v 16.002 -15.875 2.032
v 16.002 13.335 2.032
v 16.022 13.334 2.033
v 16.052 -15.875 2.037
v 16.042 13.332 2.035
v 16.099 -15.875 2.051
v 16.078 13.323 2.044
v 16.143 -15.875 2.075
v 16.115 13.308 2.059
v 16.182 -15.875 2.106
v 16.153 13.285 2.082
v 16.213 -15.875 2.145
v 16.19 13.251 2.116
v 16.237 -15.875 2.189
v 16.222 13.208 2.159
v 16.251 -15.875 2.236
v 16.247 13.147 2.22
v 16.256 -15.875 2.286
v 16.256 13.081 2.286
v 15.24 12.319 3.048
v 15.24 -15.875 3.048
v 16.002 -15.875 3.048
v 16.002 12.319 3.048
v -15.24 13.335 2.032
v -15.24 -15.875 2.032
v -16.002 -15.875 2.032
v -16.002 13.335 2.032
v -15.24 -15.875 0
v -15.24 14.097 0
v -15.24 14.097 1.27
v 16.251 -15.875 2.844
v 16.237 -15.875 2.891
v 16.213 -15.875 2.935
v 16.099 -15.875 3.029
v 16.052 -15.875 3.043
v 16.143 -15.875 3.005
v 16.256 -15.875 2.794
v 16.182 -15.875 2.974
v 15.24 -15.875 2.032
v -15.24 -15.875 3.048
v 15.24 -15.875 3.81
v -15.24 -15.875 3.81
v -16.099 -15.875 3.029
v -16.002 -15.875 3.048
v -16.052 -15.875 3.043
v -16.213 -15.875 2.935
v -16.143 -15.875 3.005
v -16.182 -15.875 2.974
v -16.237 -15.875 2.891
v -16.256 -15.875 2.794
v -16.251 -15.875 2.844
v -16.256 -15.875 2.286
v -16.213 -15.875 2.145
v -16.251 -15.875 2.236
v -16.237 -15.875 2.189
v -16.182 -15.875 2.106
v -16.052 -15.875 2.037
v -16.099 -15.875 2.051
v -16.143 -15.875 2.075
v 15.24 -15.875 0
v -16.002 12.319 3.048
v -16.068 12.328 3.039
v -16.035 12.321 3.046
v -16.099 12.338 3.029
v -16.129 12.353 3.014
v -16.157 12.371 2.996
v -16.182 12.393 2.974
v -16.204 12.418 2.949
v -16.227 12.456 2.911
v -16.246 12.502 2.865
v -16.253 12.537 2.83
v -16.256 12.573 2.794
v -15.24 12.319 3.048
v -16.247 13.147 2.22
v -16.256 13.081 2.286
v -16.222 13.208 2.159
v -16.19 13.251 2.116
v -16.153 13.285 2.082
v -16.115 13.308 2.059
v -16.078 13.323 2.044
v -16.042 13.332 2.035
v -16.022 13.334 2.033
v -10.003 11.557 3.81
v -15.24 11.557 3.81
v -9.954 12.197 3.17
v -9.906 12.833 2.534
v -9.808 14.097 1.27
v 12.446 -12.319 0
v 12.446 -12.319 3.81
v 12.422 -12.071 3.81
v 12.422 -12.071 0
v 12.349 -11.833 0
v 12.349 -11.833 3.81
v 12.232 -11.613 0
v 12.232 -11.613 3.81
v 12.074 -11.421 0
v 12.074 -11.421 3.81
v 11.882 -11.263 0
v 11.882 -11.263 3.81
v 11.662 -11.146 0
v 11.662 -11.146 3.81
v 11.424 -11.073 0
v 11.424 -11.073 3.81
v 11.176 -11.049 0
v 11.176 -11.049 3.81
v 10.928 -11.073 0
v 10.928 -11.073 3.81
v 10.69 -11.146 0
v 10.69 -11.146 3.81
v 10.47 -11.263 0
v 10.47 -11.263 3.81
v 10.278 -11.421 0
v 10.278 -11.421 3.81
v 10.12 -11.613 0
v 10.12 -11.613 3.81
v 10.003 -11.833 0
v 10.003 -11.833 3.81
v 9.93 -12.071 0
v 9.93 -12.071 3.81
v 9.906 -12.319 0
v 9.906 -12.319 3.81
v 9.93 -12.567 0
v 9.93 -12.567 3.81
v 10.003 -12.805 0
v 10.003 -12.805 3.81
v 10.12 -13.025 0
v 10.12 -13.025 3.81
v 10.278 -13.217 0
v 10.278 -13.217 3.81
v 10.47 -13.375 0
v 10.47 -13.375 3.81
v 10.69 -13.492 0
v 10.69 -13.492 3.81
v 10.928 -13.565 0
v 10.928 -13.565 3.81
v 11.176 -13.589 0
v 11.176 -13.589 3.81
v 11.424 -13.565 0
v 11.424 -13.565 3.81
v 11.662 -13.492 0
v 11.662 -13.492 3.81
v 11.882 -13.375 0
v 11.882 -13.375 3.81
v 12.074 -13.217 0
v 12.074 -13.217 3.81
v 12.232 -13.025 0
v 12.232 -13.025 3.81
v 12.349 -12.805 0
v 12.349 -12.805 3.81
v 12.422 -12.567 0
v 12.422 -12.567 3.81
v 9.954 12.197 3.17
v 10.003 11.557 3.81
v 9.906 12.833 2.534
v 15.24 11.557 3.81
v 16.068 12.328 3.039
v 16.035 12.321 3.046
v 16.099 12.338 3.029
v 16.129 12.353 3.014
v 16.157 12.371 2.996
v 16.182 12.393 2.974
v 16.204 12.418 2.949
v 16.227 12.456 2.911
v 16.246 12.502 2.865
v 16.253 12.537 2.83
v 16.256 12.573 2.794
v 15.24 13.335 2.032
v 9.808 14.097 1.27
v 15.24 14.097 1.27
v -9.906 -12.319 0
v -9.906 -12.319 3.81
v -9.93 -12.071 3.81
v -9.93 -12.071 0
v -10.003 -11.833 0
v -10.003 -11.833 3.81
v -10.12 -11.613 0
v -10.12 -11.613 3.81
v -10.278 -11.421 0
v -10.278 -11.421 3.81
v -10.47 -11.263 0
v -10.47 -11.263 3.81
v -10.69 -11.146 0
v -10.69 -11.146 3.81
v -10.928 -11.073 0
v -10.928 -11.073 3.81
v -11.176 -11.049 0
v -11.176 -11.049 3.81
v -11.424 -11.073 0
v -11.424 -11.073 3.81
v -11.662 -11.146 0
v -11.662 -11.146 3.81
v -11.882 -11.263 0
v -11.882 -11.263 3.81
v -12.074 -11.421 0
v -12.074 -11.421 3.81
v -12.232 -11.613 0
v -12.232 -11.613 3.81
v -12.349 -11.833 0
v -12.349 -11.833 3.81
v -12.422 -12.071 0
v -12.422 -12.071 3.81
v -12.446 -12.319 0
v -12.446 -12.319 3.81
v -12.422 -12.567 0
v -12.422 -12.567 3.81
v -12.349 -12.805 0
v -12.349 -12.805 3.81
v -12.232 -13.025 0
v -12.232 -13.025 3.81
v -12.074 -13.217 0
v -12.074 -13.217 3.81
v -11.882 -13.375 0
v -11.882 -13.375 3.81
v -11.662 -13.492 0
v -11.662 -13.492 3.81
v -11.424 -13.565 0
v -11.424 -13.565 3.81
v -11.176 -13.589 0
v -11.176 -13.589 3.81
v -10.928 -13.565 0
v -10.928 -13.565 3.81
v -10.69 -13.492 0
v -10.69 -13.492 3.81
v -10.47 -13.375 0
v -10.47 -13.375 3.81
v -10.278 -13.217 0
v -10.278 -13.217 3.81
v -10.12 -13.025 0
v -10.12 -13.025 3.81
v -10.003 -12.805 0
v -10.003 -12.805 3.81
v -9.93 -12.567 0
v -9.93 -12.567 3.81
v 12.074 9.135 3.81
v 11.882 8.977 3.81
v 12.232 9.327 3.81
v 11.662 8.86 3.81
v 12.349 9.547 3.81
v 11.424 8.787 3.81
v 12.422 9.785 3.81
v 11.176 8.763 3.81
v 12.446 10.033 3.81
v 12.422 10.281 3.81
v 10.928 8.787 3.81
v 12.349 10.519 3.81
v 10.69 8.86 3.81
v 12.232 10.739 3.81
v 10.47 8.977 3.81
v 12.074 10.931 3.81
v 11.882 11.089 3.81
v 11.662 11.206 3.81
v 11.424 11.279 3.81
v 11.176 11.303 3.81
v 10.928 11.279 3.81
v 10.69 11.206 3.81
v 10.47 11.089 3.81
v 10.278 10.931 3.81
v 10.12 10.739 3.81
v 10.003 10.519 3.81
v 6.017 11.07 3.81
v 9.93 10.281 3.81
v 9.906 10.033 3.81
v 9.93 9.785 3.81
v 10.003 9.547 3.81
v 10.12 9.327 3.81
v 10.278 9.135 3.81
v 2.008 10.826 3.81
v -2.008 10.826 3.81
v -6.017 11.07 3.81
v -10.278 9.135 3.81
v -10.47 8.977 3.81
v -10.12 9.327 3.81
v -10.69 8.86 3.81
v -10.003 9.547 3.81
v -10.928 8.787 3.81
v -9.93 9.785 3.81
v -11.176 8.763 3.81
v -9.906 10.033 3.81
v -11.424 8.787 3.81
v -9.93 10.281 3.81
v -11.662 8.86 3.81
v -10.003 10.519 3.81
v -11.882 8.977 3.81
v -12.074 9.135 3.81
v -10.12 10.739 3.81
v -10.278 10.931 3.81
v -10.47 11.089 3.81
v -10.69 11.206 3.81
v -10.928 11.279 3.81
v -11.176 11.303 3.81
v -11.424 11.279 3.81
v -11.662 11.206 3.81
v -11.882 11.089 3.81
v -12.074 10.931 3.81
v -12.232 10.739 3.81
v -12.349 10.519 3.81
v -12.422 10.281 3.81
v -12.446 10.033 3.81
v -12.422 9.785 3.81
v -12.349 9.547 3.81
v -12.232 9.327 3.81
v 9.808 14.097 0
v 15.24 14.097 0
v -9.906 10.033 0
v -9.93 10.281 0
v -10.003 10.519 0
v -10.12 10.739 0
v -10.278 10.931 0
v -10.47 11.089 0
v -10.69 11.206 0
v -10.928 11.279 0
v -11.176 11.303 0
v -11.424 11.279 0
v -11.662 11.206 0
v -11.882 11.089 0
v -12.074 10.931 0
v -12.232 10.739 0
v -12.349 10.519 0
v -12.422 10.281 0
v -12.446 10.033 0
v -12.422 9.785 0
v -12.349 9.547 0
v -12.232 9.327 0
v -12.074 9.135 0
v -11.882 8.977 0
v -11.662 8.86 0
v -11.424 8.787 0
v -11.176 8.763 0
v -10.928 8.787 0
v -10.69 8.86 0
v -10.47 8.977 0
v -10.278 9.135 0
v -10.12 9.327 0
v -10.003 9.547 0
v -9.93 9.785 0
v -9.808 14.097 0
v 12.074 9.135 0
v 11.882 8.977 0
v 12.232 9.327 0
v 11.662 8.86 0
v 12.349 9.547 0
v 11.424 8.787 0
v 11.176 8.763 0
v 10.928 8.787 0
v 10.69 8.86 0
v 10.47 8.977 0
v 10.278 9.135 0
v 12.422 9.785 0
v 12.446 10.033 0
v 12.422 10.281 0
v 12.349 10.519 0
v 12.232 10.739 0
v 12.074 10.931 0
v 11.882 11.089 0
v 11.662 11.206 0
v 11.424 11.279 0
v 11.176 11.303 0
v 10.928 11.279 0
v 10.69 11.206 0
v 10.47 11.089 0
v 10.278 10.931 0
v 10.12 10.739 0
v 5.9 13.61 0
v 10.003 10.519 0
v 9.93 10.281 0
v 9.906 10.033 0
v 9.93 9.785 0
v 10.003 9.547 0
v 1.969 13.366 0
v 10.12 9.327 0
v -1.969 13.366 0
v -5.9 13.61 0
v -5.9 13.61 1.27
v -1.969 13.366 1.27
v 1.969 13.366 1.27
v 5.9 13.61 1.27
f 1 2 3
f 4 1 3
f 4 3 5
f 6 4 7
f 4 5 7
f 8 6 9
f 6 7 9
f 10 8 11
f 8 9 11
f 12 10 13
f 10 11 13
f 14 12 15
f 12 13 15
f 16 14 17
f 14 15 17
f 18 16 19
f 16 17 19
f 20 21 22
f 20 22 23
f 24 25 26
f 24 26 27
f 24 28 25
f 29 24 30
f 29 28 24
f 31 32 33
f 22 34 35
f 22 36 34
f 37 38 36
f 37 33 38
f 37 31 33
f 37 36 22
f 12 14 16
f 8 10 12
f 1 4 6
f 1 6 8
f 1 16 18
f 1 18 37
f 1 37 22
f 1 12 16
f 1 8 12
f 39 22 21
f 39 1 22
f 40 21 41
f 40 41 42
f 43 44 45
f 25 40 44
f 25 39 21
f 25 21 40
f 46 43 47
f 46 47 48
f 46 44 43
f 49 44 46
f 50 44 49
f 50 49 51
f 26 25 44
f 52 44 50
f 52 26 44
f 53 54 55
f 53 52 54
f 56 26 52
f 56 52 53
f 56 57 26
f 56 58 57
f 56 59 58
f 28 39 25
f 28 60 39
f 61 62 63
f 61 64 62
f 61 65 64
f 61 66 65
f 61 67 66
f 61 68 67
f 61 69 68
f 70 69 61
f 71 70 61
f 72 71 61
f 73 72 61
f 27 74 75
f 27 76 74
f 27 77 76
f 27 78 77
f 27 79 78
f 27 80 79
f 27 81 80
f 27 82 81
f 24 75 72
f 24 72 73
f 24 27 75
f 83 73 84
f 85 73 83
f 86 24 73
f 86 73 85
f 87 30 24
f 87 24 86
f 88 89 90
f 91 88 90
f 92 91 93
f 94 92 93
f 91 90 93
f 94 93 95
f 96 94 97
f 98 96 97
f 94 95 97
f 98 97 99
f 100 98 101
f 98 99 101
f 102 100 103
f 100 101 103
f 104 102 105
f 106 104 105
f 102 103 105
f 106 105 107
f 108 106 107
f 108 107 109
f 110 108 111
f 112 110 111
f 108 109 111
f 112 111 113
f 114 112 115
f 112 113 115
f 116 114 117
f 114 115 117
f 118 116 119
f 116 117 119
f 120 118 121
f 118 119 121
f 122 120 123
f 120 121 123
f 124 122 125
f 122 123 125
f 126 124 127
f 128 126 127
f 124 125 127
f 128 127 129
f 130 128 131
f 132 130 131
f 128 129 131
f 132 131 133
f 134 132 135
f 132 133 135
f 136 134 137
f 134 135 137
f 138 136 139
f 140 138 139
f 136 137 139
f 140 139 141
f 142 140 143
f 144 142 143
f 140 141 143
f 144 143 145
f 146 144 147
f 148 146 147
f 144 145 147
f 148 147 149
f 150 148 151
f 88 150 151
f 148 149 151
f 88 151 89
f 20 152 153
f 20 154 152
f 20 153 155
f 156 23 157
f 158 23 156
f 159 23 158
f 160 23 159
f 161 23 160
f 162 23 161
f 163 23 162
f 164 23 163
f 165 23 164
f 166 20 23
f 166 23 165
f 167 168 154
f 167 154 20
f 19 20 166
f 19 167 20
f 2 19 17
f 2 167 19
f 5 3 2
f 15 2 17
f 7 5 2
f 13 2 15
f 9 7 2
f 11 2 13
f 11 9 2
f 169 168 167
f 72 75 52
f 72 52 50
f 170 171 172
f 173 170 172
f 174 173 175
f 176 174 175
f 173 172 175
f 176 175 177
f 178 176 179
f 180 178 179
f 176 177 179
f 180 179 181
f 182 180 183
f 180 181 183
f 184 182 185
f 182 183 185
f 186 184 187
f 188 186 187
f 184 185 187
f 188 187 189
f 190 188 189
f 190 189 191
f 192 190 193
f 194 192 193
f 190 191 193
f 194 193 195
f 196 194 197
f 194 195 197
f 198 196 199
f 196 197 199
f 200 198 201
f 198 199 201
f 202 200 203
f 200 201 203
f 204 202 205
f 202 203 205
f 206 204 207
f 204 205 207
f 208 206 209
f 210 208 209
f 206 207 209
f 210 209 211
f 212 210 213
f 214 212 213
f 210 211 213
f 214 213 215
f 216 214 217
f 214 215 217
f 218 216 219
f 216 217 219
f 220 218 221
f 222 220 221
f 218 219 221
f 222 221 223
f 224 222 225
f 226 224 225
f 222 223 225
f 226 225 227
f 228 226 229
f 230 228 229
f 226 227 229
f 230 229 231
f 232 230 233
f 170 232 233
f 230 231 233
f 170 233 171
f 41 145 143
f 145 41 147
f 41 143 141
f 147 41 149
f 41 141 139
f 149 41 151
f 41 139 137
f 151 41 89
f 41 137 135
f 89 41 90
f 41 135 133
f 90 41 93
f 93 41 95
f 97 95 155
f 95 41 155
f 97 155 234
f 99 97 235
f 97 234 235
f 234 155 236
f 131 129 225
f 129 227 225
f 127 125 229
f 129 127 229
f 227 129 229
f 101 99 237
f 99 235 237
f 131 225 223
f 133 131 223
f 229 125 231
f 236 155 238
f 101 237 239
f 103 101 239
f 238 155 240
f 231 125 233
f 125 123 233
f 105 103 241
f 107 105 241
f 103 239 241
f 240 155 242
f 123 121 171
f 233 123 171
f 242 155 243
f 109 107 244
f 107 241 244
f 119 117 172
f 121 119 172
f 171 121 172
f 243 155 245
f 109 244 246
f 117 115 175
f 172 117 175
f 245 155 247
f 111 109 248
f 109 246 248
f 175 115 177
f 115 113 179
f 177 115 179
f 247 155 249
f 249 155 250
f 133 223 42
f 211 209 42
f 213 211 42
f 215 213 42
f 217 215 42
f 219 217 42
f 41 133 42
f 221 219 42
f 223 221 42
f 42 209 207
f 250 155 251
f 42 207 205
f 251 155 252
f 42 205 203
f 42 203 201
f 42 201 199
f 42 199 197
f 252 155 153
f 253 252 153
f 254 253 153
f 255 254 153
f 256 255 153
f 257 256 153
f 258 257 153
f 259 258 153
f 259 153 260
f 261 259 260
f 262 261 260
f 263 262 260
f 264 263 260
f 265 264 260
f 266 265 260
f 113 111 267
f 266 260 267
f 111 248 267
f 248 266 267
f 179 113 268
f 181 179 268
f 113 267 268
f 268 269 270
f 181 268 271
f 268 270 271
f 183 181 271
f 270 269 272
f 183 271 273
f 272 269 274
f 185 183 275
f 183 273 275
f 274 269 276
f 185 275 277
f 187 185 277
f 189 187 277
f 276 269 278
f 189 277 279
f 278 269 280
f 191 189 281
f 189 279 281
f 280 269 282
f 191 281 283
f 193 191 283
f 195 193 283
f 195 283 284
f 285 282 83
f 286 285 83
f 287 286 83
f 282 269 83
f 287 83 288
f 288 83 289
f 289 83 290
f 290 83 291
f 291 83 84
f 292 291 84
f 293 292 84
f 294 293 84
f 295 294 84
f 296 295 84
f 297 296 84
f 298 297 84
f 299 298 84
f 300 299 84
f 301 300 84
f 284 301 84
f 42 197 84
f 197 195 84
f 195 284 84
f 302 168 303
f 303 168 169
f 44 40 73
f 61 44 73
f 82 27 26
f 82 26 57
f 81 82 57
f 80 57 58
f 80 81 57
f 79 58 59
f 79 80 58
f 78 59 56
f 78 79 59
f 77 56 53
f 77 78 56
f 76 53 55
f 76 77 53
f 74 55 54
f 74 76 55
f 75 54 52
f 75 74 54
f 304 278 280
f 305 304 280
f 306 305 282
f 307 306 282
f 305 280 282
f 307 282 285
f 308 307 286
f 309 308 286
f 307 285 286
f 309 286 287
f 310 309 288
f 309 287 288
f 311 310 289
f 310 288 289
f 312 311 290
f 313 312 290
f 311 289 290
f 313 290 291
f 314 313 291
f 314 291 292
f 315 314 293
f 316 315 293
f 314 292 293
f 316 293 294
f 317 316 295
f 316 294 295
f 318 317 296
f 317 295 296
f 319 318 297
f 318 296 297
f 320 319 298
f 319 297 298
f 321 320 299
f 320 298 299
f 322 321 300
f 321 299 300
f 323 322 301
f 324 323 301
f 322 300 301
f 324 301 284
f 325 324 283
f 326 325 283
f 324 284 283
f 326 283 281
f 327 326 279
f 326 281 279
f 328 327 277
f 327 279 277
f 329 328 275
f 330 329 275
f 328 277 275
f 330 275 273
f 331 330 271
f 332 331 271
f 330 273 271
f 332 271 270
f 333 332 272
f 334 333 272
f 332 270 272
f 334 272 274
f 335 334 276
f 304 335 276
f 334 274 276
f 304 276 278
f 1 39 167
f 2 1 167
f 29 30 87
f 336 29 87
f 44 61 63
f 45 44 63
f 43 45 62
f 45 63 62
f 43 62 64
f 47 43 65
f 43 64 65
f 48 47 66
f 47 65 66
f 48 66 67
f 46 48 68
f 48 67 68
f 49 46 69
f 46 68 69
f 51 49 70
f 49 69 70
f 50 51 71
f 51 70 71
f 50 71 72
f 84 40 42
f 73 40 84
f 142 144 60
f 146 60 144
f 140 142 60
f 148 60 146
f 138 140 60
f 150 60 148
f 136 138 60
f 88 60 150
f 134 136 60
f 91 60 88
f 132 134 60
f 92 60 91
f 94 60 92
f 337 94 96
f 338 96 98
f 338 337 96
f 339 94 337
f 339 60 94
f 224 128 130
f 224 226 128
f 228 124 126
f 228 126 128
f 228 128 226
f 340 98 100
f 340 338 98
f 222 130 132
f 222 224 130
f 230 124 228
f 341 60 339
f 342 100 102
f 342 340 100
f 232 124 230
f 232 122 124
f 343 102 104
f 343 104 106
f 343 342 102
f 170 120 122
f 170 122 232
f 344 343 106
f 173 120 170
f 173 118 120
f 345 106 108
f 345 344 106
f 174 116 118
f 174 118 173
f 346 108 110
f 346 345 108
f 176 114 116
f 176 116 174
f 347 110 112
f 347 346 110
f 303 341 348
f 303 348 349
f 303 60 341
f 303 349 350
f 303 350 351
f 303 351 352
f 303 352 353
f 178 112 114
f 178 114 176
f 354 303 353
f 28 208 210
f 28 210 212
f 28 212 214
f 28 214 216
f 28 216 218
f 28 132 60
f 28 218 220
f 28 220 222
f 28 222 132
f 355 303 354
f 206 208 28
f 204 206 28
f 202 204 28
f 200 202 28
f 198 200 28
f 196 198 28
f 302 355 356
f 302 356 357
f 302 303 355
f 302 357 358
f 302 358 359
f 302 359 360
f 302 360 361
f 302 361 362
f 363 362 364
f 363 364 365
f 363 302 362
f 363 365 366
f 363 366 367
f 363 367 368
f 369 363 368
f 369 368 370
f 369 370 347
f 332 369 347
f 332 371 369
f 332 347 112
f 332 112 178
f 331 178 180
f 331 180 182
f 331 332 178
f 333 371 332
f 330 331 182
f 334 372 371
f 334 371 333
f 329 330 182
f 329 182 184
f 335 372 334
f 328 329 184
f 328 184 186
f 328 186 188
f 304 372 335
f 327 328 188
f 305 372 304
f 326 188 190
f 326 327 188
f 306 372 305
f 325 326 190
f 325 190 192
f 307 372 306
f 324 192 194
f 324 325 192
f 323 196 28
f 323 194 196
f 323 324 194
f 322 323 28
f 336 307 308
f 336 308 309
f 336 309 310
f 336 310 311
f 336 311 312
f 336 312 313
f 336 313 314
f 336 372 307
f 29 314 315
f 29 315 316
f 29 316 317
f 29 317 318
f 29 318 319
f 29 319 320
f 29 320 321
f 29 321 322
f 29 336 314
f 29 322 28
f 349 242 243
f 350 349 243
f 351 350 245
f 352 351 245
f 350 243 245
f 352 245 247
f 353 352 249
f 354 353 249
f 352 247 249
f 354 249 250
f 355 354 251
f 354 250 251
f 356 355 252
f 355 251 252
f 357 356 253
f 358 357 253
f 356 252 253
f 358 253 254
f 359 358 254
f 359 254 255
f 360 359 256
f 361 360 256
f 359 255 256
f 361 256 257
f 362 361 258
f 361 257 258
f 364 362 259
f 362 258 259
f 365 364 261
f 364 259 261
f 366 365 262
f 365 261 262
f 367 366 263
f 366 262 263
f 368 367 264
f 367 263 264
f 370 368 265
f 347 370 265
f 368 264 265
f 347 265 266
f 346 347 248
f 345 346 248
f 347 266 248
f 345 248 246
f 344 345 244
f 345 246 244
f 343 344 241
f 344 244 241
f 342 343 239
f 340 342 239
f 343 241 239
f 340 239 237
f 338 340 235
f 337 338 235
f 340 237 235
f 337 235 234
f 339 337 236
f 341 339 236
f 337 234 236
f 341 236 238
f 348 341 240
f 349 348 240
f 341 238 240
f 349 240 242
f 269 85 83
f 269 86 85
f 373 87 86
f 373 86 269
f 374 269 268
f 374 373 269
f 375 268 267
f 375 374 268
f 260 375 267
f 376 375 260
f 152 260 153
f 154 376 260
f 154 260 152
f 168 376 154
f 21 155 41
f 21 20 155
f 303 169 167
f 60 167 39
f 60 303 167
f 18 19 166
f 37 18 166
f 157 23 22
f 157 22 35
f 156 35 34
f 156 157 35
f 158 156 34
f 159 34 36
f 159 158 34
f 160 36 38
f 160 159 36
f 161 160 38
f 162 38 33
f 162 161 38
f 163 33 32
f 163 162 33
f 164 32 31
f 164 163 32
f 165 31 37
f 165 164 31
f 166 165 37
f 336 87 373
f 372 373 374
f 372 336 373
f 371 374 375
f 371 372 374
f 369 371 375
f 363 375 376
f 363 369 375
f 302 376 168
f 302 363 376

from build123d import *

# Parameters (mm, degrees)
BOSS_EXTRUDE1_DEPTH = 3.81
SKETCH3_R           = 1.27
CUT_EXTRUDE1_DEPTH  = 3.81
SKETCH4_W           = 1.016
SKETCH4_H           = 31.065921614
BOSS_EXTRUDE3_DEPTH = 1.016
FILLET2_R           = 0.254
FILLET3_R           = 0.254
SKETCH5_W           = 35.250778146
SKETCH5_H           = 1.778
CUT_EXTRUDE2_DEPTH  = 3.81
CHAMFER1_SIZE       = 2.54


with BuildPart() as part:
    # Sketch1 → Boss-Extrude1 (new body)
    with BuildSketch(Plane.XY):
        with BuildLine():
            Line((15.24, -15.875), (-15.24, -15.875))
            Line((-15.24, -15.875), (-15.24, 15.190921614))
            ThreePointArc((-15.24, 15.190921614), (0, 13.335), (15.24, 15.190921614))
            Line((15.24, 15.190921614), (15.24, -15.875))
        make_face()
    extrude(amount=BOSS_EXTRUDE1_DEPTH)

    # Sketch3 → Cut-Extrude1 (cut)
    with BuildSketch(Plane.XY.offset(3.81)):
        with Locations((-11.176, 10.033)):
            Circle(SKETCH3_R)
        with Locations((11.176, 10.033)):
            Circle(SKETCH3_R)
        with Locations((11.176, -12.319)):
            Circle(SKETCH3_R)
        with Locations((-11.176, -12.319)):
            Circle(SKETCH3_R)
    extrude(amount=-CUT_EXTRUDE1_DEPTH, mode=Mode.SUBTRACT)

    # Sketch4 → Boss-Extrude3 (add)
    with BuildSketch(Plane.ZY.offset(15.24)):
        with Locations((2.54, -0.342039193)):
            Rectangle(SKETCH4_W, SKETCH4_H)
    boss_extrude3 = extrude(amount=BOSS_EXTRUDE3_DEPTH)

    # Fillet2
    fillet2_edges = [part.edges().sort_by_distance(p)[0] for p in [
        (-16.256, -0.342039193, 2.032),
        (-16.256, -0.342039193, 3.048),
    ]]
    fillet(fillet2_edges, radius=FILLET2_R)

    # Mirror4: Boss-Extrude3 across plane
    add(boss_extrude3.mirror(Plane(origin=(0, 0, 0), x_dir=(0, 0, 1), z_dir=(1, 0, 0))))

    # Fillet3
    fillet3_edges = [part.edges().sort_by_distance(p)[0] for p in [
        (16.256, -0.342039193, 2.032),
        (16.256, -0.342039193, 3.048),
    ]]
    fillet(fillet3_edges, radius=FILLET3_R)

    # Sketch5 → Cut-Extrude2 (cut)
    with BuildSketch(Plane.XY.offset(3.81)):
        with Locations((-0.154610927, 14.986)):
            Rectangle(SKETCH5_W, SKETCH5_H)
    extrude(amount=-CUT_EXTRUDE2_DEPTH, mode=Mode.SUBTRACT)

    # Chamfer1
    chamfer1_edges = [part.edges().sort_by_distance(p)[0] for p in [
        (12.523910582, 14.097, 3.81),
        (-12.523910582, 14.097, 3.81),
        (0, 13.335, 3.81),
    ]]
    chamfer(chamfer1_edges, length=CHAMFER1_SIZE)


solid = part.part
